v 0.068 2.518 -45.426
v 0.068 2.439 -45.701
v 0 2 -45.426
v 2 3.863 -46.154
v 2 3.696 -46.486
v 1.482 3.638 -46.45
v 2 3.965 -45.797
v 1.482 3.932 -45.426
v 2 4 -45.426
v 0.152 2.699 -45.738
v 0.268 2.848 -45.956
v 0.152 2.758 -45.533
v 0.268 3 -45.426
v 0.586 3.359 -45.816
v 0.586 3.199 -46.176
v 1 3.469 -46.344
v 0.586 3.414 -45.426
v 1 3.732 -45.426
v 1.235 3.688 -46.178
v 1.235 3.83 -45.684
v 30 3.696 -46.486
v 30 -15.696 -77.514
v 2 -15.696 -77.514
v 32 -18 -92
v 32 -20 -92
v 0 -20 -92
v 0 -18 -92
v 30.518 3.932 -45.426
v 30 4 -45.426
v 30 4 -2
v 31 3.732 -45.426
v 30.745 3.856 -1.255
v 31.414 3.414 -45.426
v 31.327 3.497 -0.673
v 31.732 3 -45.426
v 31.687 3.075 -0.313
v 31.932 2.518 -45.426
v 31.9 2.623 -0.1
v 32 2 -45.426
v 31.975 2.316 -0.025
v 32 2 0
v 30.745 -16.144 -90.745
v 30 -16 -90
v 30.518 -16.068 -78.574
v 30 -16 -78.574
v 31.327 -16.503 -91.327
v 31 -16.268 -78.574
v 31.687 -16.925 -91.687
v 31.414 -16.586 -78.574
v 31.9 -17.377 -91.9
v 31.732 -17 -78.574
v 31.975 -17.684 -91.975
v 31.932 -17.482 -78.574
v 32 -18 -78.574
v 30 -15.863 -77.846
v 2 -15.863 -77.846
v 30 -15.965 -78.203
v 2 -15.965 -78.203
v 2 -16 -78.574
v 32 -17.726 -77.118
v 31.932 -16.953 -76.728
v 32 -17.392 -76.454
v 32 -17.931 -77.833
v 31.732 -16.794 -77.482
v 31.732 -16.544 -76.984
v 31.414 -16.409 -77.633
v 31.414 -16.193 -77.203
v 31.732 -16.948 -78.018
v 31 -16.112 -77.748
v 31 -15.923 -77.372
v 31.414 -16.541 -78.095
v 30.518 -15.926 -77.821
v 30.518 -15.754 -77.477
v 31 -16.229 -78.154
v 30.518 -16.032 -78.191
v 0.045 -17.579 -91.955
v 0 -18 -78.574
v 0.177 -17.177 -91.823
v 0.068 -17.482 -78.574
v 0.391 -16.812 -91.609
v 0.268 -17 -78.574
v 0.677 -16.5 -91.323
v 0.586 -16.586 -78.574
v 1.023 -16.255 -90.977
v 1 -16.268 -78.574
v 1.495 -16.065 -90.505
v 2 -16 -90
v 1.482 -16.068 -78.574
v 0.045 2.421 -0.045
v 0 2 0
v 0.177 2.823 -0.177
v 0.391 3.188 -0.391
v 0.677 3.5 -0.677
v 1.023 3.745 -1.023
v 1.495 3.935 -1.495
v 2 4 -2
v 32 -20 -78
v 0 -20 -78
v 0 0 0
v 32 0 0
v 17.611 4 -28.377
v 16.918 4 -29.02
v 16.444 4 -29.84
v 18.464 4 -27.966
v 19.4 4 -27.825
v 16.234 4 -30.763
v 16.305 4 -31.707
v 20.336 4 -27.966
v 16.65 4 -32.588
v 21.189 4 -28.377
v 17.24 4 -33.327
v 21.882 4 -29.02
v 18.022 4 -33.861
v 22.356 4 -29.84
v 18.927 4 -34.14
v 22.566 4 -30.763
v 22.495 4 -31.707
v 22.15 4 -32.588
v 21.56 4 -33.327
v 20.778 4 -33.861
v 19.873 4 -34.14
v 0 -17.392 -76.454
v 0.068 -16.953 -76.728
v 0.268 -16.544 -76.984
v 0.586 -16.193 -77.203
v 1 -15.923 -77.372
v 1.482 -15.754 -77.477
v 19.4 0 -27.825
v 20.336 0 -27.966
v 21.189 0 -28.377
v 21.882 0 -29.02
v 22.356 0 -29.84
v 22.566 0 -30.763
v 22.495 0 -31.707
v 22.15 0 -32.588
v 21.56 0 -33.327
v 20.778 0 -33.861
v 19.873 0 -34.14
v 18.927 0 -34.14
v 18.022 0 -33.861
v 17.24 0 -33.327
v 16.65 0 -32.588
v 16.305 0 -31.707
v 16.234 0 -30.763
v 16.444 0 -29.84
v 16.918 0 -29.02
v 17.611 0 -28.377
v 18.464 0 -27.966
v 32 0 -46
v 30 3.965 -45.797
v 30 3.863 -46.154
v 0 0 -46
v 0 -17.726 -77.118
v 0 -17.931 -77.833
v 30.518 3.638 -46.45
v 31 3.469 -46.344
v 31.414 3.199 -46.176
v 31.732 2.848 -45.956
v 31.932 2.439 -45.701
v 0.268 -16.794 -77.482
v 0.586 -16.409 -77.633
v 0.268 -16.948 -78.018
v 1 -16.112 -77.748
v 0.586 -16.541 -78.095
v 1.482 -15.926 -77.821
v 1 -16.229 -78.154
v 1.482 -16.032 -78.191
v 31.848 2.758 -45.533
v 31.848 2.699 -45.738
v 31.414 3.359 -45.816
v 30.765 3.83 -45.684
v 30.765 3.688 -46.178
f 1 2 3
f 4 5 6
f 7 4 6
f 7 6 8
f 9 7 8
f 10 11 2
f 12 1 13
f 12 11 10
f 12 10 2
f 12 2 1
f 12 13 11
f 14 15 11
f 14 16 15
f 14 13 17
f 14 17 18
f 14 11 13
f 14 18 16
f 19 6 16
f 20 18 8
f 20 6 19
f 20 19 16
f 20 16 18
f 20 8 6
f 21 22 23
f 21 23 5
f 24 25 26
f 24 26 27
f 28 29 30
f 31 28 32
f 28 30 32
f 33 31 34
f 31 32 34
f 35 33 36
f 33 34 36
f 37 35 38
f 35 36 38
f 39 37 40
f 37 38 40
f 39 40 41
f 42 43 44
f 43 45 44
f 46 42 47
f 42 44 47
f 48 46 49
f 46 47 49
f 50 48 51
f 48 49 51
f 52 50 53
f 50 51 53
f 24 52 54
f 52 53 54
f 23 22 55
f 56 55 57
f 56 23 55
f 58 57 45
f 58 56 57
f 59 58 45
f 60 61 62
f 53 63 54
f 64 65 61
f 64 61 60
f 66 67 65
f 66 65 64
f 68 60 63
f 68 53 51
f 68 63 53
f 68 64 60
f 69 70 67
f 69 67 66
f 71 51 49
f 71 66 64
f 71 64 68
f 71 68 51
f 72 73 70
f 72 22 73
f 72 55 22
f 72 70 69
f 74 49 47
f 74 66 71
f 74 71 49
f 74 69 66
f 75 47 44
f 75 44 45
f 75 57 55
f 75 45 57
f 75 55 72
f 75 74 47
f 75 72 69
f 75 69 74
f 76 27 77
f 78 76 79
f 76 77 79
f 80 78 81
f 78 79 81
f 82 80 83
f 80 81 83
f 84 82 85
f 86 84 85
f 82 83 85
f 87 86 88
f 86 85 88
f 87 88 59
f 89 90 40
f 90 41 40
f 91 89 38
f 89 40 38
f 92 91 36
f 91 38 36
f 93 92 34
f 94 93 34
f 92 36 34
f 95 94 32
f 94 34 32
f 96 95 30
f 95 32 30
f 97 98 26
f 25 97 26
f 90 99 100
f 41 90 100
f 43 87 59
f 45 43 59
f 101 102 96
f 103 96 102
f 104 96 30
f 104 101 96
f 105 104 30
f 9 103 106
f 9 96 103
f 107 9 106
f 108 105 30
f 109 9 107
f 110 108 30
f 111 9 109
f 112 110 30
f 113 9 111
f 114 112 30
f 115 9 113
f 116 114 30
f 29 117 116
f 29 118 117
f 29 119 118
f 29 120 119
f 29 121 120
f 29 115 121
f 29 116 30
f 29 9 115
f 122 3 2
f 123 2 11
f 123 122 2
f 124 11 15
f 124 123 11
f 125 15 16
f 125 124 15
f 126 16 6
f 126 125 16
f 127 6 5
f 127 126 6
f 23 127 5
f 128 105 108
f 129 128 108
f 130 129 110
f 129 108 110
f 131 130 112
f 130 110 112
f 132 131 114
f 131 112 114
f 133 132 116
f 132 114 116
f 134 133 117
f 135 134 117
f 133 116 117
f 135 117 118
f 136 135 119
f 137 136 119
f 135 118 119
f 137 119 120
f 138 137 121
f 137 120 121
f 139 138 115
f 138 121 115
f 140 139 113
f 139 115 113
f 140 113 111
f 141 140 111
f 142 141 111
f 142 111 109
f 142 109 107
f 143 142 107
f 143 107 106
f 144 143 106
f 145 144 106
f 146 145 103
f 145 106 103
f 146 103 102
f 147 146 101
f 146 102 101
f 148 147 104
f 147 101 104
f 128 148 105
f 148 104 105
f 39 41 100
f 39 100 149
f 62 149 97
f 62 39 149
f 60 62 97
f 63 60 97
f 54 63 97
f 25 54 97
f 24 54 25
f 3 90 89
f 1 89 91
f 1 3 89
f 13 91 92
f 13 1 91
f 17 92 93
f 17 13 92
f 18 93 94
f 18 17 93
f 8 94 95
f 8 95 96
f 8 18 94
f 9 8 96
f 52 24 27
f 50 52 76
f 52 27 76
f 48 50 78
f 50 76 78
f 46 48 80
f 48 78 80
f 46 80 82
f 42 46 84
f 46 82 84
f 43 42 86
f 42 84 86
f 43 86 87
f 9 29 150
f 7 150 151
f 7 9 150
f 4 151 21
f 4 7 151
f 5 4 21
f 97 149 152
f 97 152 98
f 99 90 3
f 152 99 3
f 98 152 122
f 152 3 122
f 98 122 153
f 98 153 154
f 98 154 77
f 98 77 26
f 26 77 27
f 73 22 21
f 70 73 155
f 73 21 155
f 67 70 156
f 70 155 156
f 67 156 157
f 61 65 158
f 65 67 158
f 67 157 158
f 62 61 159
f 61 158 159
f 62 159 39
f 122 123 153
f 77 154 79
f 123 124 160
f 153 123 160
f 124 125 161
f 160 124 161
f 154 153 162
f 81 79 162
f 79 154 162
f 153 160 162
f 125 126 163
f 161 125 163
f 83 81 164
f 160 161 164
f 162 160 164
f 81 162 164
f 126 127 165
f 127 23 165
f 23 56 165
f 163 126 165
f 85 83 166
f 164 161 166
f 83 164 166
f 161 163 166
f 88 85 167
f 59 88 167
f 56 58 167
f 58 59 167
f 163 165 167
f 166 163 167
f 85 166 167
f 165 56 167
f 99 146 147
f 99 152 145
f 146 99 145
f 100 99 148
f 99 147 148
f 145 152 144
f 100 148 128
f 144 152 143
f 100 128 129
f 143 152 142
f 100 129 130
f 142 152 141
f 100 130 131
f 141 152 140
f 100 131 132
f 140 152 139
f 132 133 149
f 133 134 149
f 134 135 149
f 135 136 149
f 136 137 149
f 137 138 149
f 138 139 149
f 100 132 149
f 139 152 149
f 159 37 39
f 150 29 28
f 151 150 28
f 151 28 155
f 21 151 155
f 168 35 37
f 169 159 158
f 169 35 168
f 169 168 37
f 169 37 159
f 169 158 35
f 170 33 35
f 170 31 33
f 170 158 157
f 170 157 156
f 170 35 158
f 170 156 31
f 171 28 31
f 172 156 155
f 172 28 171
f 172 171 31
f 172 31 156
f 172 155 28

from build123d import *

# Parameters (mm, degrees)
SKETCH1_W           = 32
SKETCH1_H           = 92
BOSS_EXTRUDE1_DEPTH = 4
SKETCH2_R           = 3.175
CUT_EXTRUDE1_DEPTH  = 4
BOSS_EXTRUDE2_DEPTH = 32
CUT_EXTRUDE3_DEPTH  = 100.438423157
FILLET1_R           = 2


with BuildPart() as part:
    # Sketch1 → Boss-Extrude1 (new body)
    with BuildSketch(Plane(origin=(0, 0, 0), x_dir=(1, 0, 0), z_dir=(0, 1, 0))):
        with Locations((16, 46)):
            Rectangle(SKETCH1_W, SKETCH1_H)
    extrude(amount=BOSS_EXTRUDE1_DEPTH)

    # Sketch2 → Cut-Extrude1 (cut)
    with BuildSketch(Plane(origin=(0, 4, 0), x_dir=(1, 0, 0), z_dir=(0, 1, 0))):
        with Locations(Location((19.4, 31, 0), (0, 0, 270))):
            Circle(SKETCH2_R)
    extrude(amount=-CUT_EXTRUDE1_DEPTH, mode=Mode.SUBTRACT)

    # Sketch4 → Boss-Extrude2 (add)
    with BuildSketch(Plane(origin=(32, 0, 0), x_dir=(0, 0, -1), z_dir=(1, 0, 0))):
        Polygon((52.4, 0), (46, 0), (78, -20), (92, -20), (92, -16), (78, -16), align=None)
        Polygon((46, 4), (46, 0), (52.4, 0), align=None)
    extrude(amount=-BOSS_EXTRUDE2_DEPTH)

    # Sketch6 → Cut-Extrude3 (cut, through all)
    with BuildSketch(Plane(origin=(32, 0, 0), x_dir=(0, 0, -1), z_dir=(1, 0, 0))):
        Polygon((52.4, 0), (46, 4), (92, 4), (92, 0), align=None)
    extrude(amount=-CUT_EXTRUDE3_DEPTH, mode=Mode.SUBTRACT)

    # Fillet1
    fillet1_edges = [part.edges().sort_by_distance(p)[0] for p in [
        (32, 4, -23),
        (32, -16, -85),
        (16, -16, -78),
        (16, -16, -92),
        (32, -6, -62),
        (0, -6, -62),
        (0, -16, -85),
        (0, 4, -23),
        (16, 4, -46),
        (16, 4, 0),
    ]]
    fillet(fillet1_edges, radius=FILLET1_R)


solid = part.part
